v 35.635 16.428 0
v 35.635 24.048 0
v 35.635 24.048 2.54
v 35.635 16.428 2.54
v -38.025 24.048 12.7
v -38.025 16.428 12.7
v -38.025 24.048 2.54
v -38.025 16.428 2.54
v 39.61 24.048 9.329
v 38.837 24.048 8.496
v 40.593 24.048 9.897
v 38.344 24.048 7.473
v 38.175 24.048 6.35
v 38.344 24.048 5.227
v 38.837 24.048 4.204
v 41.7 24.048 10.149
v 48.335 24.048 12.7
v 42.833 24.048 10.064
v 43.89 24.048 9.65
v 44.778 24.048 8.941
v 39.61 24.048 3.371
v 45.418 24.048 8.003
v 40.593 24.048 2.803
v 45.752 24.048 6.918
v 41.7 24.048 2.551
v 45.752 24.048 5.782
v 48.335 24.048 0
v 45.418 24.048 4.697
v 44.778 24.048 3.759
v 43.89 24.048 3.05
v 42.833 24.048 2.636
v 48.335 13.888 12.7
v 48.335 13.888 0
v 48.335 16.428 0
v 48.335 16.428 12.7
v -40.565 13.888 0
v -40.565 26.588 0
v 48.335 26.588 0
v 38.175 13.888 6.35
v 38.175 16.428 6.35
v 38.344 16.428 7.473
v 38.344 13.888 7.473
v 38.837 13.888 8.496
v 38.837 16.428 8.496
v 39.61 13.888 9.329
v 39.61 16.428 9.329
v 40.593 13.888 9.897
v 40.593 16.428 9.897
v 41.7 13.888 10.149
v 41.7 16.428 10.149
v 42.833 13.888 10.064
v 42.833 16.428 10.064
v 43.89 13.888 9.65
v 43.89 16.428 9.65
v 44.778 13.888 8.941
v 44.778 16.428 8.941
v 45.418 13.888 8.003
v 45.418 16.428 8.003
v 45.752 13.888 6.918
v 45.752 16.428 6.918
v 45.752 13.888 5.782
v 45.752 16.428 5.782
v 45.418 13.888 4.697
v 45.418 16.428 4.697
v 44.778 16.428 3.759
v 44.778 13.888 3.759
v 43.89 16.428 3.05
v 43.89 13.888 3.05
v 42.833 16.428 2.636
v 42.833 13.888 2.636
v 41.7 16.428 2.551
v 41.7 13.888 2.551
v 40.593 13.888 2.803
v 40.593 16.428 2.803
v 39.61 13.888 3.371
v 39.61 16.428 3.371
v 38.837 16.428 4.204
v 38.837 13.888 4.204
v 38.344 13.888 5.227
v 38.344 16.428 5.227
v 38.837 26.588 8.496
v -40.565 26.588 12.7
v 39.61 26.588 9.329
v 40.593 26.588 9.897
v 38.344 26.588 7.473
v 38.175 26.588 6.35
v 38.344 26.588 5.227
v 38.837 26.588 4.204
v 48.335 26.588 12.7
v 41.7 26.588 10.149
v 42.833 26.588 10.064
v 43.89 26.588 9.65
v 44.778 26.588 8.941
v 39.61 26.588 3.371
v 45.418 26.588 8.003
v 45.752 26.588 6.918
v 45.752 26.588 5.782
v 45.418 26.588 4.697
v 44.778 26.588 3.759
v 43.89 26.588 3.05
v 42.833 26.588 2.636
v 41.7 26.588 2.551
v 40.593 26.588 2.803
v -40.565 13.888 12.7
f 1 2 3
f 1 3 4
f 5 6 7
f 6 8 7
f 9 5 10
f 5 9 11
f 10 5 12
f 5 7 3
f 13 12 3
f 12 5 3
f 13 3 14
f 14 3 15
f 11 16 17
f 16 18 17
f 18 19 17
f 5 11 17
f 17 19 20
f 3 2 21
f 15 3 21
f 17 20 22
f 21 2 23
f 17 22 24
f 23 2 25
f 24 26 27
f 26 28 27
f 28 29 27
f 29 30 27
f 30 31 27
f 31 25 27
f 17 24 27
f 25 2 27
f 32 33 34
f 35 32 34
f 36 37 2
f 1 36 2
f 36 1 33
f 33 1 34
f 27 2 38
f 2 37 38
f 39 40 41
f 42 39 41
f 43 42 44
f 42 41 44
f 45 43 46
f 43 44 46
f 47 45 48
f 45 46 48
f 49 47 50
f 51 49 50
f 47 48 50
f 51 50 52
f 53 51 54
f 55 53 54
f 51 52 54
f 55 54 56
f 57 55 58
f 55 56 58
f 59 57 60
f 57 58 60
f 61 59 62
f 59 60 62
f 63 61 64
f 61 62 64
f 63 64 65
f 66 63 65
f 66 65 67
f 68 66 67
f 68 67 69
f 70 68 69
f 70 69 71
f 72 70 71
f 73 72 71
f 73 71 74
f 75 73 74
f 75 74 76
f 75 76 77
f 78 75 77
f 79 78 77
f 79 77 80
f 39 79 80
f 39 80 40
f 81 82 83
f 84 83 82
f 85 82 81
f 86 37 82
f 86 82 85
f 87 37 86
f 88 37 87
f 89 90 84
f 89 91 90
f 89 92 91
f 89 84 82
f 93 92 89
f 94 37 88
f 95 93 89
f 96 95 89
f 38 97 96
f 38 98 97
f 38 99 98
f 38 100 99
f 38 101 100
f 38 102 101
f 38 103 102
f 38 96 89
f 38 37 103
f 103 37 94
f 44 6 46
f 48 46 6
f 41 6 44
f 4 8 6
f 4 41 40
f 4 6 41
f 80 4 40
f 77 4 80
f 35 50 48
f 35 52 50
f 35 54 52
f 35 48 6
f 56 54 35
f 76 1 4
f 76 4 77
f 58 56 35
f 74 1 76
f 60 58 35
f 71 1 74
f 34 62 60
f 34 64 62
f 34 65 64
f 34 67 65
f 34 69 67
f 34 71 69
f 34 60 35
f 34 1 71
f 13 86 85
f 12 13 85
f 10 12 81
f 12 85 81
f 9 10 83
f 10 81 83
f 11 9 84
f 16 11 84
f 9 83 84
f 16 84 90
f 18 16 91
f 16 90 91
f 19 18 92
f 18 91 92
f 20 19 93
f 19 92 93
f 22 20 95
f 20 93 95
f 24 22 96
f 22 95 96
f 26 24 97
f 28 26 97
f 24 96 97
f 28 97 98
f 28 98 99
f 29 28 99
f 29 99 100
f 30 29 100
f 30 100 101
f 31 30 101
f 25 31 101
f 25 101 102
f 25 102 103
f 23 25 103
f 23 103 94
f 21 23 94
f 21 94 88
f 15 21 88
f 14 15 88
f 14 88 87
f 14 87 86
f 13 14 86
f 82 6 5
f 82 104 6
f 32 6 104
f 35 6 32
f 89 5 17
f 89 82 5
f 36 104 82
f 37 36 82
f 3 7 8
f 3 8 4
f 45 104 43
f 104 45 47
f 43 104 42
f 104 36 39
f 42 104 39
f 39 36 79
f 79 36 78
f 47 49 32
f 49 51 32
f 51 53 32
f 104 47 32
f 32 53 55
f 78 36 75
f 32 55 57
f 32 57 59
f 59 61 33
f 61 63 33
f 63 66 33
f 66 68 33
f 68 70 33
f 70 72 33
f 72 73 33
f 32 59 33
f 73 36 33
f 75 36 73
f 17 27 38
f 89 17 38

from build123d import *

# Parameters (mm, degrees)
F0_W     = 88.9
F0_H     = 12.7
F1_DEPTH = 12.7
F2_W     = 83.82
F2_H     = 7.62
F3_DEPTH = 10.16
F4_T     = -2.54
F5_W     = 12.7
F5_H     = 7.62
F6_DEPTH = 25.4
F7_R     = 3.81
F8_DEPTH = 25.4


with BuildPart() as f1:
    # F0 (on Top) → F1 (new body)
    with BuildSketch(Plane.XY):
        with Locations((3.885043, 20.237593)):
            Rectangle(F0_W, F0_H)
    extrude(amount=F1_DEPTH)

    # F2 (on face) → F3 (join)
    with BuildSketch(Plane.XY.offset(12.7)):
        with Locations((3.885043, 20.237593)):
            Rectangle(F2_W, F2_H)
    extrude(amount=-F3_DEPTH)

    # F4
    f4_openings = [f1.faces().sort_by_distance(p)[0] for p in [
        (3.885043, 20.237593, 12.7),
    ]]
    offset(amount=F4_T, openings=f4_openings)

    # F5 (on face) → F6 (cut)
    with BuildSketch(Plane(origin=(0, 0, 0), x_dir=(1, 0, 0), z_dir=(0, 0, -1))):
        with Locations((41.985043, -20.237593)):
            Rectangle(F5_W, F5_H)
    extrude(amount=-F6_DEPTH, mode=Mode.SUBTRACT)

    # F7 (on face) → F8 (cut)
    with BuildSketch(Plane(origin=(0, 26.587593, 0), x_dir=(-1, 0, 0), z_dir=(0, 1, 0))):
        with Locations((-41.985043, 6.35)):
            Circle(F7_R)
    extrude(amount=-F8_DEPTH, mode=Mode.SUBTRACT)


solid = f1.part
